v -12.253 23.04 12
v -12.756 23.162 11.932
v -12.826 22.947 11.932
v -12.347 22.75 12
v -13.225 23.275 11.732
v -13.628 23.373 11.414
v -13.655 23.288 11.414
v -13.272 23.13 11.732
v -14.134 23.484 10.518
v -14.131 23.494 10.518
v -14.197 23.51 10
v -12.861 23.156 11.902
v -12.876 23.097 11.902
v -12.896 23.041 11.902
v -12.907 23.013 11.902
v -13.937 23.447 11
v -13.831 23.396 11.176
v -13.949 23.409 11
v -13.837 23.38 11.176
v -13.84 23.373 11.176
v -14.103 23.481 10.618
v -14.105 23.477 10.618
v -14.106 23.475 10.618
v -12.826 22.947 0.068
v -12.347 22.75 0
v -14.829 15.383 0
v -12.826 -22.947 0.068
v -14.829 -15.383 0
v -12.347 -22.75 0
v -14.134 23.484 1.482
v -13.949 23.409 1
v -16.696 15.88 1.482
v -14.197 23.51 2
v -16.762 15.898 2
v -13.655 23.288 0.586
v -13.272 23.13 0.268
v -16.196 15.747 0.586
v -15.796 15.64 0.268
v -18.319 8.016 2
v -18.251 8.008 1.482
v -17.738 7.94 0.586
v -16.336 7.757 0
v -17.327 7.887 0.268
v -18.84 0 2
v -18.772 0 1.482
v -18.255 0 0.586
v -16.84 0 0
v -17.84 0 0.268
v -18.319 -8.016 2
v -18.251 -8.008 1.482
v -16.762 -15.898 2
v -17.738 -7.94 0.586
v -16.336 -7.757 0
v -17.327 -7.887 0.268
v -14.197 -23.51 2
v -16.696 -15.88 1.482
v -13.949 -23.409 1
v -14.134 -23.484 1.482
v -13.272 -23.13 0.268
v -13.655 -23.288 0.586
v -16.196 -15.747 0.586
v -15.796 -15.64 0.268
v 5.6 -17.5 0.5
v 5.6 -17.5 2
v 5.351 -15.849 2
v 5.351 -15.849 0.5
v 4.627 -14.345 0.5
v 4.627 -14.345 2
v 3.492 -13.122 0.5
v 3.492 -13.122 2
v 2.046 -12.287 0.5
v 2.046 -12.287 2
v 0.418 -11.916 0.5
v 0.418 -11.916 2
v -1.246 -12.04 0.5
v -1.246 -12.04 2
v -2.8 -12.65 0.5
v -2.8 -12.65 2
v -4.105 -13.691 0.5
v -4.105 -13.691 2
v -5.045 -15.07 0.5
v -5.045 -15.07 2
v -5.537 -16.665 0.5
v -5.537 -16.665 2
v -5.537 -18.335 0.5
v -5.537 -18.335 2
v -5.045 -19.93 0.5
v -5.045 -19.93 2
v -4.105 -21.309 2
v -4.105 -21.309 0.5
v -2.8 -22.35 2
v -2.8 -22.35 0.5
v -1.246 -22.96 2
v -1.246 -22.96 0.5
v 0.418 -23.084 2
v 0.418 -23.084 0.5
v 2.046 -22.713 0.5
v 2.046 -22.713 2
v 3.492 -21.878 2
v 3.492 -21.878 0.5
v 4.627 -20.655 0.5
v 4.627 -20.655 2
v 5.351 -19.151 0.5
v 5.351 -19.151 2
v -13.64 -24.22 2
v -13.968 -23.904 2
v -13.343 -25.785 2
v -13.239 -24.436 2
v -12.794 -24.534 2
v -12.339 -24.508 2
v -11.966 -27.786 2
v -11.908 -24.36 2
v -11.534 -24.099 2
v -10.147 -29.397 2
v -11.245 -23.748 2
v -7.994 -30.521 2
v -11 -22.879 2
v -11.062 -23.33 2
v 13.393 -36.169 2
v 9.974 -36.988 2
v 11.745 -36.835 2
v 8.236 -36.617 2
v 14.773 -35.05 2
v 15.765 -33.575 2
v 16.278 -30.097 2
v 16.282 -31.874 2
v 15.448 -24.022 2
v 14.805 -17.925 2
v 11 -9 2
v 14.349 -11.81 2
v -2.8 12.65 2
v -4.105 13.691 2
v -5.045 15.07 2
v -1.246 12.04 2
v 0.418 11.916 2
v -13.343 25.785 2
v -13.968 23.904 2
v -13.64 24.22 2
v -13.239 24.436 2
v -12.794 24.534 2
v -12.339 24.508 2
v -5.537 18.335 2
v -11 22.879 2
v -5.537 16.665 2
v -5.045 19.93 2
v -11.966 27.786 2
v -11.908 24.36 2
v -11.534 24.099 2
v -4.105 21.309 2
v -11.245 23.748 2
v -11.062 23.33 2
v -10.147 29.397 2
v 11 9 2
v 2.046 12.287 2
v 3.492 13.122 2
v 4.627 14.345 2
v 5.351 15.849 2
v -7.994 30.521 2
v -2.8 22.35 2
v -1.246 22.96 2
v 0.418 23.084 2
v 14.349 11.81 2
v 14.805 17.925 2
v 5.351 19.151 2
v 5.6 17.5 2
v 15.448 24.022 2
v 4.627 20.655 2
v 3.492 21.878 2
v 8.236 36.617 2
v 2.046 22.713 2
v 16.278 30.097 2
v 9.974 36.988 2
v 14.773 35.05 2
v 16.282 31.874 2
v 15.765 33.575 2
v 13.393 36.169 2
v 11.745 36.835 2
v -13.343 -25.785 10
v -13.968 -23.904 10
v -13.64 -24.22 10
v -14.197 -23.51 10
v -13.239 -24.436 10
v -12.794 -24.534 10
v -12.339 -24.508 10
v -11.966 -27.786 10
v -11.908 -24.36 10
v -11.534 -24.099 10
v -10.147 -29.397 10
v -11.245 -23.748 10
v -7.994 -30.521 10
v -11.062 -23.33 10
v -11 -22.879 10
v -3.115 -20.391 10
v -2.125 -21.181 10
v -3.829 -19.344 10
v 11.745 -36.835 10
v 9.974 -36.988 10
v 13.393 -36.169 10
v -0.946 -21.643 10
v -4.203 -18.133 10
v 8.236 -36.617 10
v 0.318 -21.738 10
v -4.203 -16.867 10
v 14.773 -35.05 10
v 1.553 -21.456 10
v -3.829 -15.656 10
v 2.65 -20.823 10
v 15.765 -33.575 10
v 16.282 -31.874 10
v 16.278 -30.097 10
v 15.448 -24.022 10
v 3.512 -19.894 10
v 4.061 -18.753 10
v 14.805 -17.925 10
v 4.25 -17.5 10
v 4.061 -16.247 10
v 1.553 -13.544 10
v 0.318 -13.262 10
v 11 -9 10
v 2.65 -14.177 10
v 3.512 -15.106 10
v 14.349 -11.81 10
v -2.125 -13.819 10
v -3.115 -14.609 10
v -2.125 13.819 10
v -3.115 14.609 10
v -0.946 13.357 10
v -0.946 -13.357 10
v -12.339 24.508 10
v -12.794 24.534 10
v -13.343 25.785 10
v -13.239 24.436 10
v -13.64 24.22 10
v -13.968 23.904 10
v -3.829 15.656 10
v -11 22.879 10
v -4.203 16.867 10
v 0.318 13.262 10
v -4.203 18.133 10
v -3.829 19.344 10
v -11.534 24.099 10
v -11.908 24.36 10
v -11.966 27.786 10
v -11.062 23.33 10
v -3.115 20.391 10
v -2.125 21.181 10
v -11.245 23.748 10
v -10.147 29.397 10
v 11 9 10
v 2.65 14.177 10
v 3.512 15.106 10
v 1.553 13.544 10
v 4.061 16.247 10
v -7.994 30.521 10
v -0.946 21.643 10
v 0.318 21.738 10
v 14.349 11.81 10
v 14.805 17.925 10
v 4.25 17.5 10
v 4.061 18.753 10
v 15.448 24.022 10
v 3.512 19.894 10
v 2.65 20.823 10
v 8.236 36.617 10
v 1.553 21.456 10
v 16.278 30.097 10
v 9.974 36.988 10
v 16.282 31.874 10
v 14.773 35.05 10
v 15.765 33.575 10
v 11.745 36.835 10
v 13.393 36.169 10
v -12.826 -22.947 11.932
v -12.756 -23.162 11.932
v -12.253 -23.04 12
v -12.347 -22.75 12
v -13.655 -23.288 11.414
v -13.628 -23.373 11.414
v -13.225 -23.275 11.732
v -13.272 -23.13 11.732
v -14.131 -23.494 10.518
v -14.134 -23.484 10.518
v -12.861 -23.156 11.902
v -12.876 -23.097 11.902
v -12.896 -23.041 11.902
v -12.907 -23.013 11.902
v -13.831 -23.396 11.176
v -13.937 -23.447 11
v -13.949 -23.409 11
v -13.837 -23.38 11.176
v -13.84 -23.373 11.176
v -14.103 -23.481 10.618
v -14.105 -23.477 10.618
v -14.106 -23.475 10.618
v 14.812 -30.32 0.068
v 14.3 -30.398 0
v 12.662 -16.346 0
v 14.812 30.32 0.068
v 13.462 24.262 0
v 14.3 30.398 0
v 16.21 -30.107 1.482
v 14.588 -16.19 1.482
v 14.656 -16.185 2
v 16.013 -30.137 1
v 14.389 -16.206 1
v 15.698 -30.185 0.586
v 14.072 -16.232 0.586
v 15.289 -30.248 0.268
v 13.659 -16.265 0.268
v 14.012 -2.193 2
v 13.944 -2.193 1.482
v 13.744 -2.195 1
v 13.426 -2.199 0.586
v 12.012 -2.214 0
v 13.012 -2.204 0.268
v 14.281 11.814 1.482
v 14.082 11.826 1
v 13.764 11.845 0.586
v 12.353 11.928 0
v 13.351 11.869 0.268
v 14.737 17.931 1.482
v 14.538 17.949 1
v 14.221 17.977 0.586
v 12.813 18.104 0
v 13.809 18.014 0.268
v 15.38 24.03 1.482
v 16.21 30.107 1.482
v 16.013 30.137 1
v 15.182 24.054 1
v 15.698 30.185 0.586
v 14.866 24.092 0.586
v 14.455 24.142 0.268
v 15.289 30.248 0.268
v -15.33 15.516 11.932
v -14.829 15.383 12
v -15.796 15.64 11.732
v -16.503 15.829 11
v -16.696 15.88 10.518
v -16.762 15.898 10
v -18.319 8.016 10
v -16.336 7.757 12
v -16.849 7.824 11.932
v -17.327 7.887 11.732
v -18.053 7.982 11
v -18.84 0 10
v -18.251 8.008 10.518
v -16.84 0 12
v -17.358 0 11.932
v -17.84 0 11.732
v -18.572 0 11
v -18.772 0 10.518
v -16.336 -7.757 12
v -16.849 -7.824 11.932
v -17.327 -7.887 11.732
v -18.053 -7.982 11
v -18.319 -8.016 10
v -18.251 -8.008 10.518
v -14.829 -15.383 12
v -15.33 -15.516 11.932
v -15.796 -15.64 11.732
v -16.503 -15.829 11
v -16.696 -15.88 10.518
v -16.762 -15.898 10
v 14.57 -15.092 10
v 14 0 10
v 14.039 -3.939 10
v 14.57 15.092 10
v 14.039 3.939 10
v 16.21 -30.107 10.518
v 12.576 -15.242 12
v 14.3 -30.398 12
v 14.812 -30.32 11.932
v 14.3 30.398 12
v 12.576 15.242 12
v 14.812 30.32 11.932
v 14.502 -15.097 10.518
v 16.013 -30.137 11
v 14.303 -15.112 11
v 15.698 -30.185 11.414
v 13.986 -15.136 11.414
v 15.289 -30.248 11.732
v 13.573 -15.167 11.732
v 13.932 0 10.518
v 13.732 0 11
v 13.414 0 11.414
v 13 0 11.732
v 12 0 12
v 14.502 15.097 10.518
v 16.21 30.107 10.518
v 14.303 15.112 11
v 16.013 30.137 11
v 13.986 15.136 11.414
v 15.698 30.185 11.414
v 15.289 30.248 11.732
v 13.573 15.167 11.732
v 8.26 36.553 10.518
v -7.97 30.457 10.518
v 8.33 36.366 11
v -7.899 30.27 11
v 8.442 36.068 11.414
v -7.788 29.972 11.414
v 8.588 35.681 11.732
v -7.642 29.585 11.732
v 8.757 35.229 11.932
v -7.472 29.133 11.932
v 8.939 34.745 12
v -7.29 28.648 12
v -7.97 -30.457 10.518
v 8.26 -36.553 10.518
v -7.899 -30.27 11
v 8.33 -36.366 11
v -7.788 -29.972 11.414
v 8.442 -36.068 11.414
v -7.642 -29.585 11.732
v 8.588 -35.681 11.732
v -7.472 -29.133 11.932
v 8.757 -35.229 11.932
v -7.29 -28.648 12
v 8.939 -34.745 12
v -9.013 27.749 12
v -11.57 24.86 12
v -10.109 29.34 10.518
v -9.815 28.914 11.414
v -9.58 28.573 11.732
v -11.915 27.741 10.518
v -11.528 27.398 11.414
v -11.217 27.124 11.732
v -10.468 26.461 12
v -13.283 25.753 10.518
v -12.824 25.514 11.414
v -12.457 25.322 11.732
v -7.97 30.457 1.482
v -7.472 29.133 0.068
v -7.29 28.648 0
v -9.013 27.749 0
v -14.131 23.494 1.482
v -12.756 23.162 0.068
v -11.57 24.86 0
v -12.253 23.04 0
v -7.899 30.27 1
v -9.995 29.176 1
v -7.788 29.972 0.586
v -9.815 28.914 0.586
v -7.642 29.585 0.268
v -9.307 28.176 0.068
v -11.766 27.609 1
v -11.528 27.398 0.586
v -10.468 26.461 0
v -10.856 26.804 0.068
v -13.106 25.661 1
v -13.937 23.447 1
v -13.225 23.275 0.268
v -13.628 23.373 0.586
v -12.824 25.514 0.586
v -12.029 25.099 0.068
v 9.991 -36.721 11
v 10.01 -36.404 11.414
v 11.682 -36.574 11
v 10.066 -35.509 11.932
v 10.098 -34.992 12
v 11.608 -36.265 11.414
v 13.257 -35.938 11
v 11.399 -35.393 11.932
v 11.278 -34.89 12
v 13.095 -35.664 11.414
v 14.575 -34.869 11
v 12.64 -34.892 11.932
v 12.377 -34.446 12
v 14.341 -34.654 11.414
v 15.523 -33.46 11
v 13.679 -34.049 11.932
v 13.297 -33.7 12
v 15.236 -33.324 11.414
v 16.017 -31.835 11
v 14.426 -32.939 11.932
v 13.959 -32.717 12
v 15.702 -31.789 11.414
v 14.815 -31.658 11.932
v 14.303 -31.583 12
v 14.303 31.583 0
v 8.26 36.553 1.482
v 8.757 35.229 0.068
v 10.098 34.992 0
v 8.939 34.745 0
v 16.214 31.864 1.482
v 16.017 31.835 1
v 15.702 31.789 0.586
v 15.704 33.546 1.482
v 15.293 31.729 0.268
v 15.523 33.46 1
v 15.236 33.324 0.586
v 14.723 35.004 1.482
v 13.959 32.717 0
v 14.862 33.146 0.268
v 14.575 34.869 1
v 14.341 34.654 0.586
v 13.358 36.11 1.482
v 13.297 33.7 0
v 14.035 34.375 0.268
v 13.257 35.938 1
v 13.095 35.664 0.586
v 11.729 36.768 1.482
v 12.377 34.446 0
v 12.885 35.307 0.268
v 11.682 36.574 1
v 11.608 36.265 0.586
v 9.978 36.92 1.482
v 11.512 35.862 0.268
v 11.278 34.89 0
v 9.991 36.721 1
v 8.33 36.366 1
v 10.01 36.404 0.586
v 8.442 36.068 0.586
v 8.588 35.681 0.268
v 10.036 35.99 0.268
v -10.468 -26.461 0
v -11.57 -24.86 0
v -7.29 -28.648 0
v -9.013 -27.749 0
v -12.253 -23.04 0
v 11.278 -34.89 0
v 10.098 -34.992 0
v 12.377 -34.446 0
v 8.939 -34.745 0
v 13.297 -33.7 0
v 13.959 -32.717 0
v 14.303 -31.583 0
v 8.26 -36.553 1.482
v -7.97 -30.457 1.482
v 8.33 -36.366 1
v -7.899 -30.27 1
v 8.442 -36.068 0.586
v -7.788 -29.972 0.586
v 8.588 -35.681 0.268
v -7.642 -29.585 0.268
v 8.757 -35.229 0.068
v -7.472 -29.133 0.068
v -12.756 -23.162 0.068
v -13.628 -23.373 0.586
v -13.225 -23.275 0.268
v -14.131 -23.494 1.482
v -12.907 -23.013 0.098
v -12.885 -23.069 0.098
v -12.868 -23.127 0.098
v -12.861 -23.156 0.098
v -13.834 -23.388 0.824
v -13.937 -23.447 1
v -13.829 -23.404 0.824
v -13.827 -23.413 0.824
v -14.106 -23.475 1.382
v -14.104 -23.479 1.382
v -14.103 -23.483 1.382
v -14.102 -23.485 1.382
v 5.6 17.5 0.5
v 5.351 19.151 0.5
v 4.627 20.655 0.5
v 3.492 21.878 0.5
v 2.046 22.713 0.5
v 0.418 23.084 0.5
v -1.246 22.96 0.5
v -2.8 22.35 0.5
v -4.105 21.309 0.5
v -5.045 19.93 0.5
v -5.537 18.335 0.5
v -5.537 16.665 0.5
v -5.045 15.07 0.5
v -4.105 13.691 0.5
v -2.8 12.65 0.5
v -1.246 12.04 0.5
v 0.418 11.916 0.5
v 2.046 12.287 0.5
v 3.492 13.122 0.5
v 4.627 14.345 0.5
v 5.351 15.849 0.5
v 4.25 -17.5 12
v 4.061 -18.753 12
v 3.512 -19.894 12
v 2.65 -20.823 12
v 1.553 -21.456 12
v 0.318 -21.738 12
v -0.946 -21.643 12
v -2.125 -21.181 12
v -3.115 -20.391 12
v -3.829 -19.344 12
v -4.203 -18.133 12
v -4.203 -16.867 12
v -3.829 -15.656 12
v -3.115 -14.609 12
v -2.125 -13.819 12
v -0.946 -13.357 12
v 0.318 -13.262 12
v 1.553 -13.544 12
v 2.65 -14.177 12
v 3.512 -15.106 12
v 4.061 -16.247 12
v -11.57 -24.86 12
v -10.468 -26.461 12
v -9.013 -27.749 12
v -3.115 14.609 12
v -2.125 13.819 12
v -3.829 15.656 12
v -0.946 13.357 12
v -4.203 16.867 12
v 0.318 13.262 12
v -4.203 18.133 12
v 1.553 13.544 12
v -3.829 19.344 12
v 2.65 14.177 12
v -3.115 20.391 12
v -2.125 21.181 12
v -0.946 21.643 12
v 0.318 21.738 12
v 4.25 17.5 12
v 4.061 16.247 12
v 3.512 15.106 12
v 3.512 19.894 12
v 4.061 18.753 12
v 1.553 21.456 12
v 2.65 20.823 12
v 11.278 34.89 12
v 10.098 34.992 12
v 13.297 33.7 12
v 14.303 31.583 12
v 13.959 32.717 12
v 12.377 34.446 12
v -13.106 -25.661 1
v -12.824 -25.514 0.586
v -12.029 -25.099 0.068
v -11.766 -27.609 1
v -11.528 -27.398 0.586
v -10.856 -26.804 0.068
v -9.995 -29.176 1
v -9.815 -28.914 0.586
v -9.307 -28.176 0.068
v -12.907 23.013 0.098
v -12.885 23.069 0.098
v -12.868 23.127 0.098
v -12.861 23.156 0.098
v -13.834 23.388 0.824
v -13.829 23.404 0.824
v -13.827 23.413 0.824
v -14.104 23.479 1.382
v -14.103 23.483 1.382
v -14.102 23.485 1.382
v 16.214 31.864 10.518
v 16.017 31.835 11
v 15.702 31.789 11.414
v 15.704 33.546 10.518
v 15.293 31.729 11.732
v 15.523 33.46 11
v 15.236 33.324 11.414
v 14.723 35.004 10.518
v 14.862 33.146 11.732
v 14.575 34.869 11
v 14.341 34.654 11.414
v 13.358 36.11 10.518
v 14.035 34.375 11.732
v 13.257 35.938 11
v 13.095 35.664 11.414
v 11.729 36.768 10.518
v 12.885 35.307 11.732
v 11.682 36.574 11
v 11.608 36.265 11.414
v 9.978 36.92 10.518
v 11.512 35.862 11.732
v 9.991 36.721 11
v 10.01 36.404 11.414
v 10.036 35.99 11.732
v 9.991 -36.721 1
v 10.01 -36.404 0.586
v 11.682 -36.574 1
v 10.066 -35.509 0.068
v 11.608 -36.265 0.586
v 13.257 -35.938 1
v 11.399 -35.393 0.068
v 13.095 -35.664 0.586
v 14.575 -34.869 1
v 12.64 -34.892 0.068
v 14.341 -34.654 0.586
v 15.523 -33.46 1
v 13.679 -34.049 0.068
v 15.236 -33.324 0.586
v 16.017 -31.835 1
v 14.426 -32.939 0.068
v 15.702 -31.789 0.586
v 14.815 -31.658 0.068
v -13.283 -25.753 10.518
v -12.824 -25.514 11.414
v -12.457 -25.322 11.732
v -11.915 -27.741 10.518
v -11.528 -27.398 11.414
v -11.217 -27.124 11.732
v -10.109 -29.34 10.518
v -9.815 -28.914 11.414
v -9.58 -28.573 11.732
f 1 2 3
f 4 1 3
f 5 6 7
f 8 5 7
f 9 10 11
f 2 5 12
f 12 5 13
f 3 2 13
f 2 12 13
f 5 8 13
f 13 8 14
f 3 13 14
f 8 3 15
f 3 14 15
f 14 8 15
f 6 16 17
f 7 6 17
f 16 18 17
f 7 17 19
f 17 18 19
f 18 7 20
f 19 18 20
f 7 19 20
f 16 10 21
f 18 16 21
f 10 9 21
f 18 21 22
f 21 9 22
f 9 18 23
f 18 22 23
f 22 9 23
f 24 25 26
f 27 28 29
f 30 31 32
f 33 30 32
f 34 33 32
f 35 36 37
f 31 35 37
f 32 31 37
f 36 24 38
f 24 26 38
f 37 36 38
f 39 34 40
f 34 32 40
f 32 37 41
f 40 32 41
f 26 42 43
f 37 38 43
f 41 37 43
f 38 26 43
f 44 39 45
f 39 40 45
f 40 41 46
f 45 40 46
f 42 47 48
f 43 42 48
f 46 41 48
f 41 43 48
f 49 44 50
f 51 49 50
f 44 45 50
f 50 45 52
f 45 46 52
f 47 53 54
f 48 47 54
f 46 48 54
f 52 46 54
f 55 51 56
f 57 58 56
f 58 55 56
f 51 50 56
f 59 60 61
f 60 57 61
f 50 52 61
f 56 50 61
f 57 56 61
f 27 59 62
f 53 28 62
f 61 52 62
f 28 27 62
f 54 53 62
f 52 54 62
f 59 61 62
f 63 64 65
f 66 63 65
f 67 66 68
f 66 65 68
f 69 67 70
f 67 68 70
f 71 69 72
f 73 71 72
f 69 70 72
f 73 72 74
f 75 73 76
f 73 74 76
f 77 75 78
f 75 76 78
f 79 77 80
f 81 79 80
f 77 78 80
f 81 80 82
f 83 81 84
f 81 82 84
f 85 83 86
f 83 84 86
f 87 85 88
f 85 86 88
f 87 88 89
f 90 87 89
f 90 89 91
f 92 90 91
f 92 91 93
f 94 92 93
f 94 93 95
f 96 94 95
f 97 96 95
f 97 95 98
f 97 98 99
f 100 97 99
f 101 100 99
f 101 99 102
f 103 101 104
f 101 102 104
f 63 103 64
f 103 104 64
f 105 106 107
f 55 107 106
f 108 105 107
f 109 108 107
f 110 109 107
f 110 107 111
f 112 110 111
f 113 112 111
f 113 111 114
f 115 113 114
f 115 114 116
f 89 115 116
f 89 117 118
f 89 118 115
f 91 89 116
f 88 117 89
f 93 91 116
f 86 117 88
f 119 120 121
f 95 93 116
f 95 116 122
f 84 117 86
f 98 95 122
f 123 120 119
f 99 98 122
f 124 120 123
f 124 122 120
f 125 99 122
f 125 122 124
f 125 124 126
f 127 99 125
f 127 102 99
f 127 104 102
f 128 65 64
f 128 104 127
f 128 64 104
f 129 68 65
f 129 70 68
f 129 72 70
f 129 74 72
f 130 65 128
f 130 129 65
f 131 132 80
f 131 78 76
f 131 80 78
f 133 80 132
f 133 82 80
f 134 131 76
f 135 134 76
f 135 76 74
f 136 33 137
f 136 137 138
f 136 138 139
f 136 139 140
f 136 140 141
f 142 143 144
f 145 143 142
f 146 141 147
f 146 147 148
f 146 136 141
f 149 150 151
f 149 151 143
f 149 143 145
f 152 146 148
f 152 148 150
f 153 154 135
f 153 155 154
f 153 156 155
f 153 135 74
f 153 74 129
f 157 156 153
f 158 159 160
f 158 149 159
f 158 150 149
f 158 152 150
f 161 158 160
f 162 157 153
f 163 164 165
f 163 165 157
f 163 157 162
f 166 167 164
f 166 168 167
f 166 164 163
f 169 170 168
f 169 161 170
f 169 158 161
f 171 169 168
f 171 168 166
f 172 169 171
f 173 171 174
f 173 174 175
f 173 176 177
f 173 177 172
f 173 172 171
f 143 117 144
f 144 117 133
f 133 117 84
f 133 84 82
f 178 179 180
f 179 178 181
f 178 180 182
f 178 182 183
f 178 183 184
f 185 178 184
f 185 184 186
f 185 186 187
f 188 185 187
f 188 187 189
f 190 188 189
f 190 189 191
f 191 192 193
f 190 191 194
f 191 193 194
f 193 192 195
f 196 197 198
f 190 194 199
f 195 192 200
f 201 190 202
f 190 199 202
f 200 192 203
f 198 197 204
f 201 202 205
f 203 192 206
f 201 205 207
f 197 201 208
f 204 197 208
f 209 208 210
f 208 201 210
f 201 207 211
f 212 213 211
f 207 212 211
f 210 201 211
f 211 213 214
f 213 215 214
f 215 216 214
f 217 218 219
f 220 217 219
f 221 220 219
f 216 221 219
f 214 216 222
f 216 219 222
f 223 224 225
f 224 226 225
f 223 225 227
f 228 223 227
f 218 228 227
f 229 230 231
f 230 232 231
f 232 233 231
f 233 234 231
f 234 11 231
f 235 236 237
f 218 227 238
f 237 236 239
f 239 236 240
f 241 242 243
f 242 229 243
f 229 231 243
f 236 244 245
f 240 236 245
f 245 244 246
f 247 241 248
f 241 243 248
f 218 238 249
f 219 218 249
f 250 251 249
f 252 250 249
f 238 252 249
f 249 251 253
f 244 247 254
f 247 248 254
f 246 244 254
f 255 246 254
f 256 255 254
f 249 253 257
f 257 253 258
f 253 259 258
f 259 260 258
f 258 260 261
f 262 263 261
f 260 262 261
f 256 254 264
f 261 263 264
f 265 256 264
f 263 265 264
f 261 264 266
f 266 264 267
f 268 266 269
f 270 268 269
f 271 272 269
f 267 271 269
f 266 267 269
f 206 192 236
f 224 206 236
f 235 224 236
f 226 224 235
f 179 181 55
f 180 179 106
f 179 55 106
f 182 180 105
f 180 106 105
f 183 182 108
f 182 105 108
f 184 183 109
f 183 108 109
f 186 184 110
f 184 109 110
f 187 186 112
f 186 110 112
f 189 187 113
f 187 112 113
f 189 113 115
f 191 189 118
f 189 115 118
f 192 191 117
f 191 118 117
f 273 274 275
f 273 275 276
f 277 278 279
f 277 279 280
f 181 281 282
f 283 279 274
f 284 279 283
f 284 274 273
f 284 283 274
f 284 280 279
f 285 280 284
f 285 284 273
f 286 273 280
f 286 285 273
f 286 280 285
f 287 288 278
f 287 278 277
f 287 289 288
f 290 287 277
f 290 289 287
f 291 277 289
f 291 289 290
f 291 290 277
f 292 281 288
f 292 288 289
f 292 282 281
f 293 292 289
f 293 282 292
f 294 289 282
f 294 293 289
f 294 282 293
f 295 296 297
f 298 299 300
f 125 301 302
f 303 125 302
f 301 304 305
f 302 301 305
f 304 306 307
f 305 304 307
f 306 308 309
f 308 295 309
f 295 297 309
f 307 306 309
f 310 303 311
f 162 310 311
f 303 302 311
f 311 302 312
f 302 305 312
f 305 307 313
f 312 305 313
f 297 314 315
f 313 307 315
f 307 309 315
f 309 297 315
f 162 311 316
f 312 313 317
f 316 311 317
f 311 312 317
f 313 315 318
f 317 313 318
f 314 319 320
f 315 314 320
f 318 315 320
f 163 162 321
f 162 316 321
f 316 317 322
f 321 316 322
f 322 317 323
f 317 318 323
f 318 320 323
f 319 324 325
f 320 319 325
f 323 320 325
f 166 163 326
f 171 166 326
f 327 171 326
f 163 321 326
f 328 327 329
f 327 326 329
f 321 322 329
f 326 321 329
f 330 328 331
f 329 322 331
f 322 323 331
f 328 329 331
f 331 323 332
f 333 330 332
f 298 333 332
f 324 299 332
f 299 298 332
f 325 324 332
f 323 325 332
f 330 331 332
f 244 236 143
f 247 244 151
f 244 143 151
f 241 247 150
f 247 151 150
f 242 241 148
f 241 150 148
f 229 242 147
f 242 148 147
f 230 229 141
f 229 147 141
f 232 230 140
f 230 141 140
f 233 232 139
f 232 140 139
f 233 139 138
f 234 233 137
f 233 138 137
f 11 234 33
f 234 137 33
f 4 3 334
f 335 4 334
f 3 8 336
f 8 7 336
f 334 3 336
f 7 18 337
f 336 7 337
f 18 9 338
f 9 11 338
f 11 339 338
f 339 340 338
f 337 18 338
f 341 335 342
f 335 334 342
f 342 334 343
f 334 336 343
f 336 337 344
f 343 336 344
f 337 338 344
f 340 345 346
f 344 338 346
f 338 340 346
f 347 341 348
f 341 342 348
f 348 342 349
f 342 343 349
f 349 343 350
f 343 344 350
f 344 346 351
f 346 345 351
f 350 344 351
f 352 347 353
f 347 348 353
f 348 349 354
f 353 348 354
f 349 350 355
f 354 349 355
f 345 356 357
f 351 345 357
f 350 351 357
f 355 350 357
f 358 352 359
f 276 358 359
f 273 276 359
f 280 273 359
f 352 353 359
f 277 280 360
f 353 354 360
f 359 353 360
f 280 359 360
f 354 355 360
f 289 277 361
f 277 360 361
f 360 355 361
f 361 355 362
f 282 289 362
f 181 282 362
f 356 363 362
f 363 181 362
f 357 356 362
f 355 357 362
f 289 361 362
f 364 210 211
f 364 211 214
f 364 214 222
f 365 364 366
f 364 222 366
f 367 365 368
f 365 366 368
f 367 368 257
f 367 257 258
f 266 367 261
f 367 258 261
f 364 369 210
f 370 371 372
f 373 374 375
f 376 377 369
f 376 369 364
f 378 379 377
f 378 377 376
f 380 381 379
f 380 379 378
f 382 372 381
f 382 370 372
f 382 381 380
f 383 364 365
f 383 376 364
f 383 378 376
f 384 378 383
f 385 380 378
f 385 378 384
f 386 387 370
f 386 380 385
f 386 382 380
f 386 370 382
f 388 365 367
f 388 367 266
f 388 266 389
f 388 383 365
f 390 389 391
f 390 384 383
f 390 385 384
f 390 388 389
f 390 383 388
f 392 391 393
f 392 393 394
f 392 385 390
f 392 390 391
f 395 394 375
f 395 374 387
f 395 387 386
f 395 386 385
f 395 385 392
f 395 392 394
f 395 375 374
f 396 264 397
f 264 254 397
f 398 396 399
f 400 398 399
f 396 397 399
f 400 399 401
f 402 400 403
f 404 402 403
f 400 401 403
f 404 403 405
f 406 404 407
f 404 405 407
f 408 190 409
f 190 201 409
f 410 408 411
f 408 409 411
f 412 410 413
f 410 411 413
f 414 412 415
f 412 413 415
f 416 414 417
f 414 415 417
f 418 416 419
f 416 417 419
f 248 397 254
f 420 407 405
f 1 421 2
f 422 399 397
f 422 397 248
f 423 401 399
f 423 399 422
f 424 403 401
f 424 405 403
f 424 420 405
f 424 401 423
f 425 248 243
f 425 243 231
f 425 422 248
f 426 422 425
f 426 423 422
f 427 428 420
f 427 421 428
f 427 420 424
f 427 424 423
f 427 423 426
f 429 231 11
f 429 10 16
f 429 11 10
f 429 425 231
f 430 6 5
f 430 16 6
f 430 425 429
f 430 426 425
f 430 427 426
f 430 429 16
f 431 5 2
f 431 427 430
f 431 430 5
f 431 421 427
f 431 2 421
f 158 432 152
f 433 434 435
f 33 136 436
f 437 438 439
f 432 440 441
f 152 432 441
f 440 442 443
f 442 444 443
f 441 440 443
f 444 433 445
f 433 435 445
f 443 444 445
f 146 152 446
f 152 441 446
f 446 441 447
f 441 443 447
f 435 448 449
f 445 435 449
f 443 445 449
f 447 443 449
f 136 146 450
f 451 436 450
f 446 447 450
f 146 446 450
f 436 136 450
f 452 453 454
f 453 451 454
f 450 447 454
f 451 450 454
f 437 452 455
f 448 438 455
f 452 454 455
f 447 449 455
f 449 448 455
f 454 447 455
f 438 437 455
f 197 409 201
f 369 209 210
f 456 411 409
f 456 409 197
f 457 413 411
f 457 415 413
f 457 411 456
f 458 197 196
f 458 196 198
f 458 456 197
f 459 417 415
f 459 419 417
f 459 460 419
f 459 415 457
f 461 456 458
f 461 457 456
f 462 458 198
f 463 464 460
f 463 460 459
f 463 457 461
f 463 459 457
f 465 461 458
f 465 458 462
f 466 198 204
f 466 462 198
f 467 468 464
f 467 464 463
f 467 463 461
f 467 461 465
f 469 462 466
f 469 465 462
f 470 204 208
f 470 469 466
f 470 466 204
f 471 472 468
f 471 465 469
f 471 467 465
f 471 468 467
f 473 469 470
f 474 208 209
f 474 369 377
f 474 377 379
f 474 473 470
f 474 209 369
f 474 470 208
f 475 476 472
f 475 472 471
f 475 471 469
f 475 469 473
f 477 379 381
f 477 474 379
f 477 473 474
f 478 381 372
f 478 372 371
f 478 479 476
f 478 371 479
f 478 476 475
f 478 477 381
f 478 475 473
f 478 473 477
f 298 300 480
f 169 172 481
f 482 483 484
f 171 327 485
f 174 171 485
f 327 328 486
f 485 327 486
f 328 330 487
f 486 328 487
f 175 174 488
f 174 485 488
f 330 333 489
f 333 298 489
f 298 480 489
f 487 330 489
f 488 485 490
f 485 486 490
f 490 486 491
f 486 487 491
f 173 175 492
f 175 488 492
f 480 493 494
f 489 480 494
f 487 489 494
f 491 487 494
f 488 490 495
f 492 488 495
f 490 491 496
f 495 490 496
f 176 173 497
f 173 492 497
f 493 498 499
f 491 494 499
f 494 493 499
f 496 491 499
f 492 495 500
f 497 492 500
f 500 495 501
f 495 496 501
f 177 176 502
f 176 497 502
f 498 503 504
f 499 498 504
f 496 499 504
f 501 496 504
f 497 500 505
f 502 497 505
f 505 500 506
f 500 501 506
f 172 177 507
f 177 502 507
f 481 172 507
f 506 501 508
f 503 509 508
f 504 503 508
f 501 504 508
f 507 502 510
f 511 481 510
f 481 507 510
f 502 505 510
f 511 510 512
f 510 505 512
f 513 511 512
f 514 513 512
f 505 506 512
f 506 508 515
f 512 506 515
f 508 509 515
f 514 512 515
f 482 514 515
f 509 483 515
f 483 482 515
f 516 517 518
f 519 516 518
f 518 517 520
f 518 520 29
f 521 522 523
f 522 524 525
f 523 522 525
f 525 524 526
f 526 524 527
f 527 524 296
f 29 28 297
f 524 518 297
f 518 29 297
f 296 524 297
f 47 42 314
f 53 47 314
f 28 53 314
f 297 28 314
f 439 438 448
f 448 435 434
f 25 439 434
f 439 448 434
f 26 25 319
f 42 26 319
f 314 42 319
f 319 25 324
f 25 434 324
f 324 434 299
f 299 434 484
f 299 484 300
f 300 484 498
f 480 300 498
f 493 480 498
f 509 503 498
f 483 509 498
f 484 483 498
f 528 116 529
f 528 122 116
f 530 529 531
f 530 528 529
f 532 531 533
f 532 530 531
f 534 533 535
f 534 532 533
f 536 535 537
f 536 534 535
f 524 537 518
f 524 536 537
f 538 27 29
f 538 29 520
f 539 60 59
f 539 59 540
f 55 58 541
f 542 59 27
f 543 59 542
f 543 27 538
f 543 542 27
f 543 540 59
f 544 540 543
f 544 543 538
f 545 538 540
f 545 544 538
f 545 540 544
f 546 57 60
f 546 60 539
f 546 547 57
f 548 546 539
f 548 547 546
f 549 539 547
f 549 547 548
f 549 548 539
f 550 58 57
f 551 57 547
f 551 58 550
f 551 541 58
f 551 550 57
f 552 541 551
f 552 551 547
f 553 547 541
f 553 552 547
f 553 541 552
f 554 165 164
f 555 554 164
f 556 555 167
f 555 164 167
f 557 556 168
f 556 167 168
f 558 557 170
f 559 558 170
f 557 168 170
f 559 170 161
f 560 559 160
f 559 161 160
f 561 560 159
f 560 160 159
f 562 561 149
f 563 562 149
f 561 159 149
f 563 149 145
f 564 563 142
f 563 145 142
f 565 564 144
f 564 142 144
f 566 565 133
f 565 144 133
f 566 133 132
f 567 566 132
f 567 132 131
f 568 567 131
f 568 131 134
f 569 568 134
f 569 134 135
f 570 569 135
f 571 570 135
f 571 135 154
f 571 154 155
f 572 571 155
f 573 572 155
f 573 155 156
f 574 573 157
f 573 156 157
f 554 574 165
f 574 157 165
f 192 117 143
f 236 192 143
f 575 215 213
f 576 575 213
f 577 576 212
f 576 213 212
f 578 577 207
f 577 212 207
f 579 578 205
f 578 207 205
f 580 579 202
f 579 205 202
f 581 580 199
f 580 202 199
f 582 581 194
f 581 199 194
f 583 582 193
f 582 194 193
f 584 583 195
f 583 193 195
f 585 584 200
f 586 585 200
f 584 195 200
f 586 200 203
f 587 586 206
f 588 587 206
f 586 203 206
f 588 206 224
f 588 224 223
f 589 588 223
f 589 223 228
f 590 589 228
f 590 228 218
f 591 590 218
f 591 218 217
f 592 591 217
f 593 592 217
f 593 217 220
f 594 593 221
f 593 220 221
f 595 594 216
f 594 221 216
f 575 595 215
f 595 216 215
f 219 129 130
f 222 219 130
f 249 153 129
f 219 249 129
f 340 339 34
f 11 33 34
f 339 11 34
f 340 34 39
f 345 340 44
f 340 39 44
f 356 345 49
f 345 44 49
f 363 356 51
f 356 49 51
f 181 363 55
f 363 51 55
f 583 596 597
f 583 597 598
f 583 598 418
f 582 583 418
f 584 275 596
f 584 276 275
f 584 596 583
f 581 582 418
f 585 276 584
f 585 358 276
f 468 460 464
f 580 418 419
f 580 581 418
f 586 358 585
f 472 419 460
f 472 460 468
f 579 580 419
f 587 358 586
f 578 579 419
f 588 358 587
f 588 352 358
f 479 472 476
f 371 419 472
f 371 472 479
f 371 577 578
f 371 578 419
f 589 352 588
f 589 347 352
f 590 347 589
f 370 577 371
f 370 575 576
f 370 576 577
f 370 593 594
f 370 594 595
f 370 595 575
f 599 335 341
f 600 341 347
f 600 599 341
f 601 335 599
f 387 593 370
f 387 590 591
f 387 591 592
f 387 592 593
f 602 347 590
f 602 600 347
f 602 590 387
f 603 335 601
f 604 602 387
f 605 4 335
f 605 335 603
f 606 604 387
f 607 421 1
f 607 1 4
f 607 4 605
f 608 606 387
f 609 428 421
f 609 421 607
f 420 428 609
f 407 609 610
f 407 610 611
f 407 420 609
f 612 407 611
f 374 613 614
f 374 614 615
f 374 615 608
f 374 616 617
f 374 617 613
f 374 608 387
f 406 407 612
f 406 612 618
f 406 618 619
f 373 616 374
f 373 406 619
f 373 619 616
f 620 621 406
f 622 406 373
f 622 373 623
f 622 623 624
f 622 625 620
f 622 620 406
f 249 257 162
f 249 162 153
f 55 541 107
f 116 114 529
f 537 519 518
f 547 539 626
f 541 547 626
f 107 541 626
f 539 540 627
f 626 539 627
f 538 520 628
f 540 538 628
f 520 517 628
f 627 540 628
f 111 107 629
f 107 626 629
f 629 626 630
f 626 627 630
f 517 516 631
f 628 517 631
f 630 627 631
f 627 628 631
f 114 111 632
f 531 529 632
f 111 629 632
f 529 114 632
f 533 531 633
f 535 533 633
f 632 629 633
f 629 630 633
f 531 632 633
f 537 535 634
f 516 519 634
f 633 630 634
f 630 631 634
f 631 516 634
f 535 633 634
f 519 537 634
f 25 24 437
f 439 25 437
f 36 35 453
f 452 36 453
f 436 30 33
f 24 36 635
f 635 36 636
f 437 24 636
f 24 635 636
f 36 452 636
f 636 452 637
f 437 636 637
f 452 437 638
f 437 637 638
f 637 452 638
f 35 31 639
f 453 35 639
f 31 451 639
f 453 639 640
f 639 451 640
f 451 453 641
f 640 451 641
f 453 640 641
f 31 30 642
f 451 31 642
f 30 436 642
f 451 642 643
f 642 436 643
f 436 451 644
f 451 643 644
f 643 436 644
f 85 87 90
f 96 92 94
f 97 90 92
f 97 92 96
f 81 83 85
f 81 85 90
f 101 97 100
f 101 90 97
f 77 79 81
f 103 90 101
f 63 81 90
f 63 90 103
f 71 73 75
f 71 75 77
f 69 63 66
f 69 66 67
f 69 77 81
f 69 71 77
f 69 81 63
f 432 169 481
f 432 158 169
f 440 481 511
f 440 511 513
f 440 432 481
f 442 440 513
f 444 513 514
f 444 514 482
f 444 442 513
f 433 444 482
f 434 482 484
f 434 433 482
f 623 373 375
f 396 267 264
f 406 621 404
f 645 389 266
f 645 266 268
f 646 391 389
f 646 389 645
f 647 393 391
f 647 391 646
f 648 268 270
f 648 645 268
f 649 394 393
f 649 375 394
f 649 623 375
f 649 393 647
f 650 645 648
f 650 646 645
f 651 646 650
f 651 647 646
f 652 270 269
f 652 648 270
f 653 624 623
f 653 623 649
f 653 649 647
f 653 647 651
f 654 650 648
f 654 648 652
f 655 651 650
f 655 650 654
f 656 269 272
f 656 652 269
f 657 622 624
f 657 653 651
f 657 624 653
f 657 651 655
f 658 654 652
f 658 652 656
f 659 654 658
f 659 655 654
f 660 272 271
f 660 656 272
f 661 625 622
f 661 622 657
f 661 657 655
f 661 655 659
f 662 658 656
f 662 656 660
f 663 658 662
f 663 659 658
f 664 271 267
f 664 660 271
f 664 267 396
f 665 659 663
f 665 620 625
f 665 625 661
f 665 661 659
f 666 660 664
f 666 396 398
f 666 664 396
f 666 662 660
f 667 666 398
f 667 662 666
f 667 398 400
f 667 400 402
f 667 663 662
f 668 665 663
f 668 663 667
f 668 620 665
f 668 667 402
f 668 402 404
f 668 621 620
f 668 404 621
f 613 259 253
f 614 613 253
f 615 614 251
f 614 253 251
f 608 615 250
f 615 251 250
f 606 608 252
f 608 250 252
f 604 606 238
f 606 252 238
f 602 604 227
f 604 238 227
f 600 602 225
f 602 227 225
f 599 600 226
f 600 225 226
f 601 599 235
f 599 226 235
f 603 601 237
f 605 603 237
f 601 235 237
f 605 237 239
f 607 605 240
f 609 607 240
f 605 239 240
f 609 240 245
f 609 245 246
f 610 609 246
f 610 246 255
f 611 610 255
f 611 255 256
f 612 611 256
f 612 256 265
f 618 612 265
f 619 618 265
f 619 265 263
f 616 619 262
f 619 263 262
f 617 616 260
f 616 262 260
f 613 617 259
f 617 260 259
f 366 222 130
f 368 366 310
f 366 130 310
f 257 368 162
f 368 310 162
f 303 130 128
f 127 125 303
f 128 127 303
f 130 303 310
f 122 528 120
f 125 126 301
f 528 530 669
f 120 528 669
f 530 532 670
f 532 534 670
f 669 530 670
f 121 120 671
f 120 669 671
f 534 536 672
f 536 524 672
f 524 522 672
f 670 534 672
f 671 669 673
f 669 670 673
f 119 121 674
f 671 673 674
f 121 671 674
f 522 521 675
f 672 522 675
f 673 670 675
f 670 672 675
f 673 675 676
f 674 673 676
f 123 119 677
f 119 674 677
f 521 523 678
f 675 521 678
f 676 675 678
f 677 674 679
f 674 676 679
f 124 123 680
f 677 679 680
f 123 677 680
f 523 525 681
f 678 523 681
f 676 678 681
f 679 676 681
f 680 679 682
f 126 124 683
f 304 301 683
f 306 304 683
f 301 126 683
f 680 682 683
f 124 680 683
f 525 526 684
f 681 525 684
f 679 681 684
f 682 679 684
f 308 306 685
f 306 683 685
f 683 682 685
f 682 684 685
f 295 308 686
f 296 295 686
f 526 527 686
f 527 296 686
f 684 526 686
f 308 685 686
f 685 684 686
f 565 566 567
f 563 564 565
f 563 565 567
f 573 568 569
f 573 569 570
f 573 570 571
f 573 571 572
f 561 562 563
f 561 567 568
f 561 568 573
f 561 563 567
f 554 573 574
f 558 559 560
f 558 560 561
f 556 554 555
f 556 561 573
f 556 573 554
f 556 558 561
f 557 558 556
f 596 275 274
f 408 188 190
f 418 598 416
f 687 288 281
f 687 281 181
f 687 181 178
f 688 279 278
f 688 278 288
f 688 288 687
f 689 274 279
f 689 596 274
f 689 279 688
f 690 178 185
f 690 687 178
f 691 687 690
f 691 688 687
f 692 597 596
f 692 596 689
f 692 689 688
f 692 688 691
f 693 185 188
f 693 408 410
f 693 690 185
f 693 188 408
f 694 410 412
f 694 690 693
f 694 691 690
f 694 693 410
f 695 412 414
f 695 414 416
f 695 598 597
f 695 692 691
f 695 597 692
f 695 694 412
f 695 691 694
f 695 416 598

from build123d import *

# Parameters (mm, degrees)
F1_DEPTH  = 2
F2_R      = 5.6
F3_DEPTH  = 1.5
F5_DEPTH  = 10
F7_DEPTH  = 2
F8_R      = 1.99999
F9_R      = 4.25
F10_DEPTH = 2


# Not quite as in the source:
# - a fillet or chamfer is up to 0.001 mm smaller than in the source, because OpenCascade refuses the exact size


with BuildPart() as f1:
    # F0 (on Top) → F1 (new body)
    with BuildSketch(Plane.XY):
        with BuildLine():
            Line((8.2361189543, 36.6168409437), (-7.9935965644, 30.5207371811))
            ThreePointArc((-7.9935965644, 30.5207371811), (-11.9662543406, 27.7862465208), (-14.1970285873, 23.510372898))
            ThreePointArc((-14.1970285873, 23.510372898), (-17, 0), (-14.1970285873, -23.510372898))
            ThreePointArc((-14.1970285873, -23.510372898), (-11.9662543406, -27.7862465208), (-7.9935965644, -30.5207371811))
            Line((-7.9935965644, -30.5207371811), (8.2361189543, -36.6168409437))
            ThreePointArc((8.2361189543, -36.6168409437), (14.1245779615, -35.6606279318), (16.2775548115, -30.0970873786))
            ThreePointArc((16.2775548115, -30.0970873786), (14, 0), (16.2775548115, 30.0970873786))
            ThreePointArc((16.2775548115, 30.0970873786), (14.1245779615, 35.6606279318), (8.2361189543, 36.6168409437))
        make_face()
    extrude(amount=F1_DEPTH)

    # F2 (on face) → F3 (cut)
    with BuildSketch(Plane.XY.offset(2)):
        with Locations((0, 17.5)):
            Circle(F2_R)
        with Locations((0, -17.5)):
            Circle(F2_R)
    extrude(amount=-F3_DEPTH, mode=Mode.SUBTRACT)

    # F4 (on Top) → F5 (join)
    with BuildSketch(Plane.XY):
        with BuildLine():
            Line((-11, -22.8789469535), (-11, 22.8789469535))
            ThreePointArc((-11, 22.8789469535), (-12.3390571638, 24.5083402847), (-14.1970285873, 23.510372898))
            ThreePointArc((-14.1970285873, 23.510372898), (-18.8404213522, 0), (-14.1970285873, -23.510372898))
            ThreePointArc((-14.1970285873, -23.510372898), (-12.3390571638, -24.5083402847), (-11, -22.8789469535))
        make_face()
        with BuildLine():
            Line((14.3490034732, 11.8101475791), (11, 9))
            Line((11, 9), (11, -9))
            Line((11, -9), (14.3490034732, -11.8101475791))
            ThreePointArc((14.3490034732, -11.8101475791), (14, 0), (14.3490034732, 11.8101475791))
        make_face()
    extrude(amount=F5_DEPTH)

    # F6 (on face) → F7 (join)
    with BuildSketch(Plane.XY.offset(10)):
        with BuildLine():
            Line((8.2361189543, 36.6168409437), (-7.9935965644, 30.5207371811))
            ThreePointArc((-7.9935965644, 30.5207371811), (-11.9662543406, 27.7862465208), (-14.1970285873, 23.510372898))
            ThreePointArc((-14.1970285873, 23.510372898), (-12.3390571638, 24.5083402847), (-11, 22.8789469535))
            Line((-11, 22.8789469535), (-11, -22.8789469535))
            ThreePointArc((-11, -22.8789469535), (-12.3390571638, -24.5083402847), (-14.1970285873, -23.510372898))
            ThreePointArc((-14.1970285873, -23.510372898), (-11.9662543406, -27.7862465208), (-7.9935965644, -30.5207371811))
            Line((-7.9935965644, -30.5207371811), (8.2361189543, -36.6168409437))
            ThreePointArc((8.2361189543, -36.6168409437), (14.1245779615, -35.6606279318), (16.2775548115, -30.0970873786))
            ThreePointArc((16.2775548115, -30.0970873786), (14, 0), (16.2775548115, 30.0970873786))
            ThreePointArc((16.2775548115, 30.0970873786), (14.1245779615, 35.6606279318), (8.2361189543, 36.6168409437))
        make_face()
        with BuildLine():
            ThreePointArc((-11, 22.8789469535), (-12.3390571638, 24.5083402847), (-14.1970285873, 23.510372898))
            ThreePointArc((-14.1970285873, 23.510372898), (-18.8404213522, 0), (-14.1970285873, -23.510372898))
            ThreePointArc((-14.1970285873, -23.510372898), (-12.3390571638, -24.5083402847), (-11, -22.8789469535))
            Line((-11, -22.8789469535), (-11, 22.8789469535))
        make_face()
    extrude(amount=F7_DEPTH)

    # F8 (radius 2 in the source; OpenCascade refuses exactly that, so slightly less here)
    f8_edges = [f1.edges().sort_by_distance(p)[0] for p in [
        (14.124578, 35.660628, 12),
        (0.121261, 33.568789, 12),
        (-11.966254, 27.786247, 12),
        (-18.840421, 0, 12),
        (-11.966254, -27.786247, 12),
        (0.121261, -33.568789, 12),
        (14.124578, -35.660628, 12),
        (14, 0, 12),
        (-18.840421, 0, 0),
        (14, 0, 0),
    ]]
    fillet(f8_edges, radius=F8_R)

    # F9 (on face) → F10 (cut)
    with BuildSketch(Plane(origin=(0, 0, 10), x_dir=(1, 0, 0), z_dir=(0, 0, -1))):
        with Locations((0, 17.5)):
            Circle(F9_R)
        with Locations((0, -17.5)):
            Circle(F9_R)
    extrude(amount=-F10_DEPTH, mode=Mode.SUBTRACT)


solid = f1.part
